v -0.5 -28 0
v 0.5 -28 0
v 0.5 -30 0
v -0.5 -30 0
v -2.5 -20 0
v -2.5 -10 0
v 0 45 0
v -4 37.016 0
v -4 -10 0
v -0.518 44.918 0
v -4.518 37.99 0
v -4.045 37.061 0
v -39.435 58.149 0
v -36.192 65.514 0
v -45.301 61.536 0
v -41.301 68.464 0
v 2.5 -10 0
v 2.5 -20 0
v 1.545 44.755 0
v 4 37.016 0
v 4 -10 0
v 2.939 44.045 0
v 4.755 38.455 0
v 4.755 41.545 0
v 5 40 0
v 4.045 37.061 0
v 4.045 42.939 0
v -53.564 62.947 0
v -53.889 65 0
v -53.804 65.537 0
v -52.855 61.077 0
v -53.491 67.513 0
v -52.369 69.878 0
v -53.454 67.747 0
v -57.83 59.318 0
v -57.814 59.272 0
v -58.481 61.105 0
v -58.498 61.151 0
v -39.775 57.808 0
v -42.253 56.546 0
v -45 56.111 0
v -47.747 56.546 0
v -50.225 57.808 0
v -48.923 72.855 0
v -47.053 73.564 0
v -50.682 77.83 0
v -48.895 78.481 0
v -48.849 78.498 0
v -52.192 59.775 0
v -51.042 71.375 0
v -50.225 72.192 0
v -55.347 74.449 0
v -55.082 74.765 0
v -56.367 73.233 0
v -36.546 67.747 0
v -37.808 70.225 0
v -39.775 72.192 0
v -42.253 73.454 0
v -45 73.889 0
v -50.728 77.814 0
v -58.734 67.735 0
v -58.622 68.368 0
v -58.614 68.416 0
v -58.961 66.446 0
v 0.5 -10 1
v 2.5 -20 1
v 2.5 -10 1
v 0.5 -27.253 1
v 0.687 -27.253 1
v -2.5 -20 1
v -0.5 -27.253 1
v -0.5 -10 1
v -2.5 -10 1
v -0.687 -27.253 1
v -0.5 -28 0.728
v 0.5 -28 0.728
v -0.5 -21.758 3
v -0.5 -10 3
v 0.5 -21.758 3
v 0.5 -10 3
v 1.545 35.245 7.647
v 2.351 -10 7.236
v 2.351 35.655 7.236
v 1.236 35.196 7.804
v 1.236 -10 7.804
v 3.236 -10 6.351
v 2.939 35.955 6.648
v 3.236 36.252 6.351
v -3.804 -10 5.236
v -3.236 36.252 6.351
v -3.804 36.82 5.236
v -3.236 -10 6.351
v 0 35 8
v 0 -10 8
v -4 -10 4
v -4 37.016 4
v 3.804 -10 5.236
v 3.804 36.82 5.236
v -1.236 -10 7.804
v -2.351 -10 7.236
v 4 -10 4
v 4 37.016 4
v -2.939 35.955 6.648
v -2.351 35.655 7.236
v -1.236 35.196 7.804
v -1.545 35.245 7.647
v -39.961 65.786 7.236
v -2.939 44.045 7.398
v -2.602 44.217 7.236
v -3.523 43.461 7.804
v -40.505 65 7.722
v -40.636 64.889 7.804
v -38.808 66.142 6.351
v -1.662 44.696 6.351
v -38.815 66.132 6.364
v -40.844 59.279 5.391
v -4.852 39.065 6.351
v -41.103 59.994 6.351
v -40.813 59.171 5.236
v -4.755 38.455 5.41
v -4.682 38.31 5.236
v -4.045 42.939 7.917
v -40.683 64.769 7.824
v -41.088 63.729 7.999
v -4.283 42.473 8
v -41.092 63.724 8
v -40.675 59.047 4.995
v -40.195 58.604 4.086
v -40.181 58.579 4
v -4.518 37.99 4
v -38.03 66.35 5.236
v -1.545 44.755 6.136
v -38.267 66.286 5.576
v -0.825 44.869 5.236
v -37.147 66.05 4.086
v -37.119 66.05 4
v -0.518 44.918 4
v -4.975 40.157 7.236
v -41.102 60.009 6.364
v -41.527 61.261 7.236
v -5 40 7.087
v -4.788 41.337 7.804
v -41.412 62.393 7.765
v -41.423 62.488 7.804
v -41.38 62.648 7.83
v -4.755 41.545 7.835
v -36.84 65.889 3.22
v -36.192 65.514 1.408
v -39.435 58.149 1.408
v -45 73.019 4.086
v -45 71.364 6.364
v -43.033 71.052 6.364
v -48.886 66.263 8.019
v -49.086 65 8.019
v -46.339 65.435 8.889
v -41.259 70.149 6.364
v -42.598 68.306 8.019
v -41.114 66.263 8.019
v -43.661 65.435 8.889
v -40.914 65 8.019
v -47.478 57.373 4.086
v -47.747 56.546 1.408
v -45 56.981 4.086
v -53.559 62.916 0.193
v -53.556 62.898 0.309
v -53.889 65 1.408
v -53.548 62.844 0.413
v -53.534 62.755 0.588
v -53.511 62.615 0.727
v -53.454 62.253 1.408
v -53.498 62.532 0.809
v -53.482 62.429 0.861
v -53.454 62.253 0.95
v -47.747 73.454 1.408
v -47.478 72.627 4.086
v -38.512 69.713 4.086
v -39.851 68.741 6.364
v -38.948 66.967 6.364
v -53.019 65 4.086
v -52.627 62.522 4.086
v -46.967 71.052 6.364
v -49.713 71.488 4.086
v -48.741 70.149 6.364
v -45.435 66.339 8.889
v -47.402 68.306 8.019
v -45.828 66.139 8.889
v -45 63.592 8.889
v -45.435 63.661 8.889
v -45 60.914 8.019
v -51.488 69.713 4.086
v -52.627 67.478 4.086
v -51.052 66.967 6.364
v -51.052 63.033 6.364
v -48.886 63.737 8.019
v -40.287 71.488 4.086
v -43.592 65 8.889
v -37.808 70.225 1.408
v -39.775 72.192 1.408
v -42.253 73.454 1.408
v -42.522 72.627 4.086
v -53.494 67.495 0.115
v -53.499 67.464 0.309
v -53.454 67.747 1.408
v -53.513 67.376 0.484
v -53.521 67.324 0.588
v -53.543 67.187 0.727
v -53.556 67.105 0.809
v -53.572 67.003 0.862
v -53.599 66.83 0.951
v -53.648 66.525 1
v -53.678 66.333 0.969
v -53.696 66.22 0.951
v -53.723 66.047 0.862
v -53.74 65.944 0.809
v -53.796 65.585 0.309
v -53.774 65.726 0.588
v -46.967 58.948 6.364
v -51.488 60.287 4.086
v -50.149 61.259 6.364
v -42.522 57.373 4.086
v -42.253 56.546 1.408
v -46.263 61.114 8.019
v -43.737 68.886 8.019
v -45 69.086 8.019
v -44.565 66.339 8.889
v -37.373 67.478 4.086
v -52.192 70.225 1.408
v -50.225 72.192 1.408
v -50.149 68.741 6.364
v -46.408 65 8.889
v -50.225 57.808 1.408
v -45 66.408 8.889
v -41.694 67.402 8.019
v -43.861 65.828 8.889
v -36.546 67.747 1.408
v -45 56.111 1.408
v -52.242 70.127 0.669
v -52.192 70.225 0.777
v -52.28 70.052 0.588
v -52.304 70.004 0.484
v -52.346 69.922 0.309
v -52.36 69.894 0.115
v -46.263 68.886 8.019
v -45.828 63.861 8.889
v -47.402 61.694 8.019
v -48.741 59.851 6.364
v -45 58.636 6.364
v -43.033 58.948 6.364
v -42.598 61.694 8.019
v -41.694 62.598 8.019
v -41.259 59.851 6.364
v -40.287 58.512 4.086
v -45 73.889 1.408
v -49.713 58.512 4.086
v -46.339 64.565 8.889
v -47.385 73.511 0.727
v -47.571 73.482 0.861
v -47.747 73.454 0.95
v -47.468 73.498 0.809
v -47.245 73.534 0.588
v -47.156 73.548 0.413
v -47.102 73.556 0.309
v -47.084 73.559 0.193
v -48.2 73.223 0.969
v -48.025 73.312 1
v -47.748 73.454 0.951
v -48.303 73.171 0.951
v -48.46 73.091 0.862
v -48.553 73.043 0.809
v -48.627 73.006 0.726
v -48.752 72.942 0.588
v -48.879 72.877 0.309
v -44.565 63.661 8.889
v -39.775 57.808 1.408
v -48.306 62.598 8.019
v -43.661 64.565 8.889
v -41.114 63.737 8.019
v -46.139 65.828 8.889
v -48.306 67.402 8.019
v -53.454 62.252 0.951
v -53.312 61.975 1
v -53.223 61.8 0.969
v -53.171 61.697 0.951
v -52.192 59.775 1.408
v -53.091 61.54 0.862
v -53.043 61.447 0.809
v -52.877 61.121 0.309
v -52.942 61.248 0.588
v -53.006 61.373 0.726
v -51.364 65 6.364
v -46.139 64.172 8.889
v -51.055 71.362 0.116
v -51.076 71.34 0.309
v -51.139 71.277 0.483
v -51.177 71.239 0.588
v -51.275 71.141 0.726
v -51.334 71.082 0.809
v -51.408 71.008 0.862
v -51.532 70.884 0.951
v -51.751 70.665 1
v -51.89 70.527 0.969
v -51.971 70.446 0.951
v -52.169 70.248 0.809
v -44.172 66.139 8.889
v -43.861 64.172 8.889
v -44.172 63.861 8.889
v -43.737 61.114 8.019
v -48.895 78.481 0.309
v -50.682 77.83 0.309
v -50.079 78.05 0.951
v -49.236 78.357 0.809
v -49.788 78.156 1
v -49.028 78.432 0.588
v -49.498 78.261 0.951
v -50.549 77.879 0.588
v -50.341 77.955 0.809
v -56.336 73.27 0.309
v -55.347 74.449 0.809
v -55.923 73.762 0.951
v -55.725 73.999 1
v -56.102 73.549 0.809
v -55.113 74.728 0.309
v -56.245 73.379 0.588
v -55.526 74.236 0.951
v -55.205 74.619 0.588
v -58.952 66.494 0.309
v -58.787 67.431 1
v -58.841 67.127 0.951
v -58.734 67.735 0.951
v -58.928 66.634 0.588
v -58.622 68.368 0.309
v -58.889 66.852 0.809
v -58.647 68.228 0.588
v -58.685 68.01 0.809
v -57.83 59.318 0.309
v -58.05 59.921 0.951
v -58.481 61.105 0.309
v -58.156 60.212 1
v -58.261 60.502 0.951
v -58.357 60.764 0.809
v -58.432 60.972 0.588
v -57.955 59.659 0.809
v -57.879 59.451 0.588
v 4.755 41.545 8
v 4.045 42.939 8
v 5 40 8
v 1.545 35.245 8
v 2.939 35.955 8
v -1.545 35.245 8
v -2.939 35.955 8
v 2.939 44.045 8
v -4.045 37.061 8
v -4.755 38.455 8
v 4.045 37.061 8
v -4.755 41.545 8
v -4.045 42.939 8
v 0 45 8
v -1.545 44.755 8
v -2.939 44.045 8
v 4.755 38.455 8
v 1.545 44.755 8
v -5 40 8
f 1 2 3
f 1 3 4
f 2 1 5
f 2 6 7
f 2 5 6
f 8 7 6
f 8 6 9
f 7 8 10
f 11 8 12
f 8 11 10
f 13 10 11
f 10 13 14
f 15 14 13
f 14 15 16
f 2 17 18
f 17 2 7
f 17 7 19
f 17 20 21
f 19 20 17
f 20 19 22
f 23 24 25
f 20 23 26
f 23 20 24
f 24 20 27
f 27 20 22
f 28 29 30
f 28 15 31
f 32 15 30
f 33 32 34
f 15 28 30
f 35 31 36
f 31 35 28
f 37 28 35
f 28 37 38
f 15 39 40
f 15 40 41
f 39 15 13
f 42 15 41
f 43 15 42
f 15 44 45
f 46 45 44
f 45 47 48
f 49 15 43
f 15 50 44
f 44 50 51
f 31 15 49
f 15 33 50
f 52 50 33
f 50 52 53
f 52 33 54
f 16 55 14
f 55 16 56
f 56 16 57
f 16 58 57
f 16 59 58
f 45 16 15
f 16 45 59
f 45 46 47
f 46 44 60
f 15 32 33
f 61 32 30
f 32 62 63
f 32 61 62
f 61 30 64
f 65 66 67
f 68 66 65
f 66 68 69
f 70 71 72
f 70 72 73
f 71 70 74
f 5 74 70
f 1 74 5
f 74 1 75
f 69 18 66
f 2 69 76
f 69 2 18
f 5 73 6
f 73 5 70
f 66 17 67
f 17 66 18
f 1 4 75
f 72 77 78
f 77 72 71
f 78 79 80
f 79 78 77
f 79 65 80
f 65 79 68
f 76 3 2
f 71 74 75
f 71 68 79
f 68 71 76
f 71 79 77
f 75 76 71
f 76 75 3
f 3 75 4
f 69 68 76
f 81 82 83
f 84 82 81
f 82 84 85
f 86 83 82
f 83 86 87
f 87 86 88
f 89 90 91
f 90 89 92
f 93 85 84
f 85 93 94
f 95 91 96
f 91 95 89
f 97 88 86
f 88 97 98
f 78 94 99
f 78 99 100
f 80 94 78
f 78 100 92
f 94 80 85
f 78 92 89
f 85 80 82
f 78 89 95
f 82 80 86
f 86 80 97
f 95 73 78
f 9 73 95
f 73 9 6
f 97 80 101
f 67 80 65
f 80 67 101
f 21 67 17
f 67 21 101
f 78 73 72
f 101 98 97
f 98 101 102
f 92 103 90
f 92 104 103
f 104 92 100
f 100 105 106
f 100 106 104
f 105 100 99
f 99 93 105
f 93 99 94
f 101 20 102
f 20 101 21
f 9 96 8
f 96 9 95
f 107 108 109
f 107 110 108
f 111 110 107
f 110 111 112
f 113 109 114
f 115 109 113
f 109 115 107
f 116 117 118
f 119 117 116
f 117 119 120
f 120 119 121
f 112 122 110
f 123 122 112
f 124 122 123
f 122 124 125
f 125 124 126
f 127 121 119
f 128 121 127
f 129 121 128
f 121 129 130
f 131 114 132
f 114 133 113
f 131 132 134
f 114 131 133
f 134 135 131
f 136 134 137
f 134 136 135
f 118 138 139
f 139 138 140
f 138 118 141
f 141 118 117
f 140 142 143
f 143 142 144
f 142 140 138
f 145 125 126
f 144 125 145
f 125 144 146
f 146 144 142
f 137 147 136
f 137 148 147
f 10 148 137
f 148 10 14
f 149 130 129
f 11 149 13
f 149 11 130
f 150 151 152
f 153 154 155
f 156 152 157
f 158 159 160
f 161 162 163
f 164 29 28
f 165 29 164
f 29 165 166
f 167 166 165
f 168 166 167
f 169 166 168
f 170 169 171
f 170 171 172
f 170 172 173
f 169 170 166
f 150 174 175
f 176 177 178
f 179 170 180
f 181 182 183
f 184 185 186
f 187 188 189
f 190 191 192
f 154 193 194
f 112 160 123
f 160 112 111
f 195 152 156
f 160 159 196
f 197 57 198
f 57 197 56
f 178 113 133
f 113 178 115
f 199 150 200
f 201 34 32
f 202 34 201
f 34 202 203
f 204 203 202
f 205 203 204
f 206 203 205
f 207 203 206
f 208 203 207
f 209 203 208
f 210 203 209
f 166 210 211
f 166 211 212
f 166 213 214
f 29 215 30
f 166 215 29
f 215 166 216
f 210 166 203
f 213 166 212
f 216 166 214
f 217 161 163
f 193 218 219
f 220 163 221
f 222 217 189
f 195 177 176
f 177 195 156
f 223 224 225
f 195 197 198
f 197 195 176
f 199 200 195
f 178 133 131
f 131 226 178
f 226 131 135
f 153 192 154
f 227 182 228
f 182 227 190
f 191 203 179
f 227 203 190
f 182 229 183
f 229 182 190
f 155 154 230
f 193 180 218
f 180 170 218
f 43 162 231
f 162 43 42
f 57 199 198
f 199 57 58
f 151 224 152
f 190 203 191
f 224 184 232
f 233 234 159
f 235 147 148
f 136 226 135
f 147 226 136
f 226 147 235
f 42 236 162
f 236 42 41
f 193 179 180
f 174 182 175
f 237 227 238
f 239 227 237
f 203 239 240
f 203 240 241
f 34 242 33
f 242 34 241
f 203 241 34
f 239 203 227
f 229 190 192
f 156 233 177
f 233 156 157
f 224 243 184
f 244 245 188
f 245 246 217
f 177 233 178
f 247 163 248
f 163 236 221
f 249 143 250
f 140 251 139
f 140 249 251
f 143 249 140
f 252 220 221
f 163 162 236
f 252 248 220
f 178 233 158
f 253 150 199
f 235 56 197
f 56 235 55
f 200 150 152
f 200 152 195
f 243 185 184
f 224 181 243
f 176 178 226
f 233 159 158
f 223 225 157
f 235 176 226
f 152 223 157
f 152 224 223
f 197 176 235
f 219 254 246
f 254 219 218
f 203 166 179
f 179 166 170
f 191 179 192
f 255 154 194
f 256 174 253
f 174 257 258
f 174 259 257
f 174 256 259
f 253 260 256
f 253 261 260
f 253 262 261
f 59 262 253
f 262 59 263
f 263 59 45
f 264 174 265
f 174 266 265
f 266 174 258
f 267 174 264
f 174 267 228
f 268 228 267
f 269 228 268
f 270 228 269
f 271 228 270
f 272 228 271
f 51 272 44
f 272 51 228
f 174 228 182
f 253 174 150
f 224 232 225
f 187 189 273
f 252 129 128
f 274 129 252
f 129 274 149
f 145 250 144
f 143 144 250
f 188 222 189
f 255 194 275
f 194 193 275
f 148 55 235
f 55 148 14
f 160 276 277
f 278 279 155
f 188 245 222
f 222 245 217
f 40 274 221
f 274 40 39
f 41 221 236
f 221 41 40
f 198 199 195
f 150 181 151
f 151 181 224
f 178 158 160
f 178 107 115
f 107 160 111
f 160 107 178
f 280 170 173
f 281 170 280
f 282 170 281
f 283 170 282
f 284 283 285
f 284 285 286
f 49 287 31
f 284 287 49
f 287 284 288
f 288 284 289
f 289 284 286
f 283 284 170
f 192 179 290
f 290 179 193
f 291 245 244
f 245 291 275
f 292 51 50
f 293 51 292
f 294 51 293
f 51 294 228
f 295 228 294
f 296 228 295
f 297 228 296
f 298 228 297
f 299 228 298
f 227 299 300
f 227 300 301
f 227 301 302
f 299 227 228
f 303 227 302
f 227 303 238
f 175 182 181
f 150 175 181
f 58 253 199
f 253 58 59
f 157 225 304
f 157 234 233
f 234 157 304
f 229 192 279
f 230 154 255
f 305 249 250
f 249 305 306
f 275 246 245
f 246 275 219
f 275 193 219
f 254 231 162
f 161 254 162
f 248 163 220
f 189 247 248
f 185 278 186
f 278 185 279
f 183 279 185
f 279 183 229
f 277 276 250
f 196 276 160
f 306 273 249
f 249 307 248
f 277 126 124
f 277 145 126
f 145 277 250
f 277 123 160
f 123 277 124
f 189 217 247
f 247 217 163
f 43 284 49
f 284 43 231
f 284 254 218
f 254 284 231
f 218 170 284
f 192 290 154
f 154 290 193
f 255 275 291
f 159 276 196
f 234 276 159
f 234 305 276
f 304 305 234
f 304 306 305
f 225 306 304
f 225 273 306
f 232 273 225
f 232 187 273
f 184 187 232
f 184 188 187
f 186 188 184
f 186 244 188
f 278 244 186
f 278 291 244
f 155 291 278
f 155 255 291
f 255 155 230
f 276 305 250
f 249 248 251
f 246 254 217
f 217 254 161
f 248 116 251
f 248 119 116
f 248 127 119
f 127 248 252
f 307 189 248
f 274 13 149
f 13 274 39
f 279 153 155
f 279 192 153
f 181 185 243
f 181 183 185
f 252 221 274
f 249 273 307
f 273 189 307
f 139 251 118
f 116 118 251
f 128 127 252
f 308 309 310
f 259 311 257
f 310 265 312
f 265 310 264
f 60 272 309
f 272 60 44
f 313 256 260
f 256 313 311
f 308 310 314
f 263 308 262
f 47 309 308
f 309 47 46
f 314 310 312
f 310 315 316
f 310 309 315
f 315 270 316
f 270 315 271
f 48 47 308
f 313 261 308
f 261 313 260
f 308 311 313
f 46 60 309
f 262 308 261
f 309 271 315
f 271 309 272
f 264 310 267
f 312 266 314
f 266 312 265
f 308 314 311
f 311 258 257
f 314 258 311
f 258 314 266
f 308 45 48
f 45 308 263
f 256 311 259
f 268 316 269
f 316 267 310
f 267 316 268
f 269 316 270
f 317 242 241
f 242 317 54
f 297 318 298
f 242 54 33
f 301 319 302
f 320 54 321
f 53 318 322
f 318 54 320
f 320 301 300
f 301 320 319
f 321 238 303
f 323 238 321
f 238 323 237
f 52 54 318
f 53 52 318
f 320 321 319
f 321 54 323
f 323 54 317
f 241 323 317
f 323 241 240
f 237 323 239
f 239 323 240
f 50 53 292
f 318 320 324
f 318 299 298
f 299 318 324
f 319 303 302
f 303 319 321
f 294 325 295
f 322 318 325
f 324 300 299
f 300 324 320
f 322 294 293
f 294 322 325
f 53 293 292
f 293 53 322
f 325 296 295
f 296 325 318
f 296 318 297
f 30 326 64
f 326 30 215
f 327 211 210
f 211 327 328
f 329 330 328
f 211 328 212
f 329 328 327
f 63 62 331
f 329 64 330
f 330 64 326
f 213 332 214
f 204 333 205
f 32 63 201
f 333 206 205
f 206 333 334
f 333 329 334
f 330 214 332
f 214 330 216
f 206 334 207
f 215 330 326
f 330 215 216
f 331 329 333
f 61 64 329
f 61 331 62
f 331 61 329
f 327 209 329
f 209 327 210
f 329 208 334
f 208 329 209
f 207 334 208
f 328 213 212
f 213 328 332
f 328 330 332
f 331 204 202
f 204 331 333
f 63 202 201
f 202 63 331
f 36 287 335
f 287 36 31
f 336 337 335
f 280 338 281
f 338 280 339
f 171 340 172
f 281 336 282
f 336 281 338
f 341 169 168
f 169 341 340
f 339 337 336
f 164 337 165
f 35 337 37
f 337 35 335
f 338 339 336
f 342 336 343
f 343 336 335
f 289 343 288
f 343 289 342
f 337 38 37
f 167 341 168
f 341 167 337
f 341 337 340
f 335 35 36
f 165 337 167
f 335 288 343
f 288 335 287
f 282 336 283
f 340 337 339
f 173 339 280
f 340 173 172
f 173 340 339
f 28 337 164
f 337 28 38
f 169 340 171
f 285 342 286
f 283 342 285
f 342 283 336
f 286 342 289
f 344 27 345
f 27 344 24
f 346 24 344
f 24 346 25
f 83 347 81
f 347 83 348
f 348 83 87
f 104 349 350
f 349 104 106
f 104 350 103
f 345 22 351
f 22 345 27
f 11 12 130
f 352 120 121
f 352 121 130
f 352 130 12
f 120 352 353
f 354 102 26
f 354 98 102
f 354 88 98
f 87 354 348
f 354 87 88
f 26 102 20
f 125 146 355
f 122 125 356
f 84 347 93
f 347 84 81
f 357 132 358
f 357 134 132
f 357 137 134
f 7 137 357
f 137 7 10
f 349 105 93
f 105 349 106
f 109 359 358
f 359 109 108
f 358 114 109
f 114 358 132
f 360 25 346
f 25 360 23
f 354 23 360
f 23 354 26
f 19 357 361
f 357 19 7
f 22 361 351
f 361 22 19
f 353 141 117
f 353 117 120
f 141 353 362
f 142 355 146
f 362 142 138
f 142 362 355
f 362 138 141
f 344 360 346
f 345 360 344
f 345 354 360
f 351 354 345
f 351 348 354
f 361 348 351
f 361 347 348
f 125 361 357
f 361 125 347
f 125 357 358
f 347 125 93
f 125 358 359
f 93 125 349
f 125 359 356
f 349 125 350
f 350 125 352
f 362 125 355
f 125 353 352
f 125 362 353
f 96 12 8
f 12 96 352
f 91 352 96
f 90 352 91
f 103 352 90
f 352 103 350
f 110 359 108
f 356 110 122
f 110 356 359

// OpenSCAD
PEG_OVERALL_LENGTH = 30;
PEG_POINT_LENGTH = 10;
PEG_POINT_SPINE_ANGLE = 20;
PEG_WIDTH = 5;
PEG_THICKNESS = 1;
PEG_SPINE_HEIGHT = 3;

ARM_DIAMETER = 8;
ELBOW_DIAMETER = 10;
HAND_DIAMETER = 18;
FINGER_DIAMETER = 2;

DETAIL = 20;

module point()
{
    linear_extrude(height = PEG_THICKNESS, center = false, convexity = 3, twist = 0, slices = DETAIL)
        polygon(points=[[PEG_WIDTH / -2, 0],[PEG_WIDTH / 2, 0],[0, PEG_POINT_LENGTH]]);
}

module body()
{
    union()
    {
        // Point    
        translate(v = [0, PEG_OVERALL_LENGTH - PEG_POINT_LENGTH, 0])
            point();
        // Main body
        translate(v = [PEG_WIDTH / -2, 0, 0])
            cube(size = [PEG_WIDTH, PEG_OVERALL_LENGTH - PEG_POINT_LENGTH, PEG_THICKNESS]);
        // Spine
        translate(v = [PEG_THICKNESS / -2, 0, 0])
            cube(size = [PEG_THICKNESS, PEG_OVERALL_LENGTH, PEG_SPINE_HEIGHT]);
    }
}

module peg()
{
    difference()
    {
        body();
        translate(v = [-15, PEG_OVERALL_LENGTH, 0])
            rotate(a = [90 - PEG_POINT_SPINE_ANGLE, 0, 0])
                cube(size = [30, 30, 30]);
    }
}

module flat_stick(length)
{
    union()
    {
        translate(v = [0, 0, ARM_DIAMETER / 2])
            rotate(a = [-90, 0, 0])
                cylinder(r = ARM_DIAMETER / 2, h = length, $fn = DETAIL);
        translate(v = [ARM_DIAMETER / -2, 0, 0])
            cube(size = [ARM_DIAMETER, length, ARM_DIAMETER / 2]);
    }    
}

module hand()
{
    difference()
    {
        union()
        {
            // Palm
            sphere(r = HAND_DIAMETER / 2, $fn = DETAIL);
            // Fingers
            rotate(a = [90, 0, 200])
                cylinder(r = FINGER_DIAMETER / 2, h = ARM_DIAMETER / 2 + 10, $fn = DETAIL);
            rotate(a = [90, 0, 230])
                cylinder(r = FINGER_DIAMETER / 2, h = ARM_DIAMETER / 2 + 10, $fn = DETAIL);
            rotate(a = [90, 0, 260])
                cylinder(r = FINGER_DIAMETER / 2, h = ARM_DIAMETER / 2 + 10, $fn = DETAIL);
            rotate(a = [90, 0, 290])
                cylinder(r = FINGER_DIAMETER / 2, h = ARM_DIAMETER / 2 + 10, $fn = DETAIL);
        }
        translate(v = [-15, -15, -30])
            cube(size = [30, 30, 30]);
    }
}

union()
{
    // Peg
    rotate(a = [0, 0, 180])
        peg();
    // Upper arm
    translate(v = [0, -10, 0])
        flat_stick(50);
    // Elbow
    translate(v = [0, 40, 0])
        cylinder(r = ELBOW_DIAMETER / 2, h = ARM_DIAMETER, $fn = DETAIL);
    // Lower arm
    translate(v = [0, 40, 0])
        rotate(a = [0, 0, 60])
            flat_stick(50);
    translate(v = [-45, 65, 0])
        hand();
}
